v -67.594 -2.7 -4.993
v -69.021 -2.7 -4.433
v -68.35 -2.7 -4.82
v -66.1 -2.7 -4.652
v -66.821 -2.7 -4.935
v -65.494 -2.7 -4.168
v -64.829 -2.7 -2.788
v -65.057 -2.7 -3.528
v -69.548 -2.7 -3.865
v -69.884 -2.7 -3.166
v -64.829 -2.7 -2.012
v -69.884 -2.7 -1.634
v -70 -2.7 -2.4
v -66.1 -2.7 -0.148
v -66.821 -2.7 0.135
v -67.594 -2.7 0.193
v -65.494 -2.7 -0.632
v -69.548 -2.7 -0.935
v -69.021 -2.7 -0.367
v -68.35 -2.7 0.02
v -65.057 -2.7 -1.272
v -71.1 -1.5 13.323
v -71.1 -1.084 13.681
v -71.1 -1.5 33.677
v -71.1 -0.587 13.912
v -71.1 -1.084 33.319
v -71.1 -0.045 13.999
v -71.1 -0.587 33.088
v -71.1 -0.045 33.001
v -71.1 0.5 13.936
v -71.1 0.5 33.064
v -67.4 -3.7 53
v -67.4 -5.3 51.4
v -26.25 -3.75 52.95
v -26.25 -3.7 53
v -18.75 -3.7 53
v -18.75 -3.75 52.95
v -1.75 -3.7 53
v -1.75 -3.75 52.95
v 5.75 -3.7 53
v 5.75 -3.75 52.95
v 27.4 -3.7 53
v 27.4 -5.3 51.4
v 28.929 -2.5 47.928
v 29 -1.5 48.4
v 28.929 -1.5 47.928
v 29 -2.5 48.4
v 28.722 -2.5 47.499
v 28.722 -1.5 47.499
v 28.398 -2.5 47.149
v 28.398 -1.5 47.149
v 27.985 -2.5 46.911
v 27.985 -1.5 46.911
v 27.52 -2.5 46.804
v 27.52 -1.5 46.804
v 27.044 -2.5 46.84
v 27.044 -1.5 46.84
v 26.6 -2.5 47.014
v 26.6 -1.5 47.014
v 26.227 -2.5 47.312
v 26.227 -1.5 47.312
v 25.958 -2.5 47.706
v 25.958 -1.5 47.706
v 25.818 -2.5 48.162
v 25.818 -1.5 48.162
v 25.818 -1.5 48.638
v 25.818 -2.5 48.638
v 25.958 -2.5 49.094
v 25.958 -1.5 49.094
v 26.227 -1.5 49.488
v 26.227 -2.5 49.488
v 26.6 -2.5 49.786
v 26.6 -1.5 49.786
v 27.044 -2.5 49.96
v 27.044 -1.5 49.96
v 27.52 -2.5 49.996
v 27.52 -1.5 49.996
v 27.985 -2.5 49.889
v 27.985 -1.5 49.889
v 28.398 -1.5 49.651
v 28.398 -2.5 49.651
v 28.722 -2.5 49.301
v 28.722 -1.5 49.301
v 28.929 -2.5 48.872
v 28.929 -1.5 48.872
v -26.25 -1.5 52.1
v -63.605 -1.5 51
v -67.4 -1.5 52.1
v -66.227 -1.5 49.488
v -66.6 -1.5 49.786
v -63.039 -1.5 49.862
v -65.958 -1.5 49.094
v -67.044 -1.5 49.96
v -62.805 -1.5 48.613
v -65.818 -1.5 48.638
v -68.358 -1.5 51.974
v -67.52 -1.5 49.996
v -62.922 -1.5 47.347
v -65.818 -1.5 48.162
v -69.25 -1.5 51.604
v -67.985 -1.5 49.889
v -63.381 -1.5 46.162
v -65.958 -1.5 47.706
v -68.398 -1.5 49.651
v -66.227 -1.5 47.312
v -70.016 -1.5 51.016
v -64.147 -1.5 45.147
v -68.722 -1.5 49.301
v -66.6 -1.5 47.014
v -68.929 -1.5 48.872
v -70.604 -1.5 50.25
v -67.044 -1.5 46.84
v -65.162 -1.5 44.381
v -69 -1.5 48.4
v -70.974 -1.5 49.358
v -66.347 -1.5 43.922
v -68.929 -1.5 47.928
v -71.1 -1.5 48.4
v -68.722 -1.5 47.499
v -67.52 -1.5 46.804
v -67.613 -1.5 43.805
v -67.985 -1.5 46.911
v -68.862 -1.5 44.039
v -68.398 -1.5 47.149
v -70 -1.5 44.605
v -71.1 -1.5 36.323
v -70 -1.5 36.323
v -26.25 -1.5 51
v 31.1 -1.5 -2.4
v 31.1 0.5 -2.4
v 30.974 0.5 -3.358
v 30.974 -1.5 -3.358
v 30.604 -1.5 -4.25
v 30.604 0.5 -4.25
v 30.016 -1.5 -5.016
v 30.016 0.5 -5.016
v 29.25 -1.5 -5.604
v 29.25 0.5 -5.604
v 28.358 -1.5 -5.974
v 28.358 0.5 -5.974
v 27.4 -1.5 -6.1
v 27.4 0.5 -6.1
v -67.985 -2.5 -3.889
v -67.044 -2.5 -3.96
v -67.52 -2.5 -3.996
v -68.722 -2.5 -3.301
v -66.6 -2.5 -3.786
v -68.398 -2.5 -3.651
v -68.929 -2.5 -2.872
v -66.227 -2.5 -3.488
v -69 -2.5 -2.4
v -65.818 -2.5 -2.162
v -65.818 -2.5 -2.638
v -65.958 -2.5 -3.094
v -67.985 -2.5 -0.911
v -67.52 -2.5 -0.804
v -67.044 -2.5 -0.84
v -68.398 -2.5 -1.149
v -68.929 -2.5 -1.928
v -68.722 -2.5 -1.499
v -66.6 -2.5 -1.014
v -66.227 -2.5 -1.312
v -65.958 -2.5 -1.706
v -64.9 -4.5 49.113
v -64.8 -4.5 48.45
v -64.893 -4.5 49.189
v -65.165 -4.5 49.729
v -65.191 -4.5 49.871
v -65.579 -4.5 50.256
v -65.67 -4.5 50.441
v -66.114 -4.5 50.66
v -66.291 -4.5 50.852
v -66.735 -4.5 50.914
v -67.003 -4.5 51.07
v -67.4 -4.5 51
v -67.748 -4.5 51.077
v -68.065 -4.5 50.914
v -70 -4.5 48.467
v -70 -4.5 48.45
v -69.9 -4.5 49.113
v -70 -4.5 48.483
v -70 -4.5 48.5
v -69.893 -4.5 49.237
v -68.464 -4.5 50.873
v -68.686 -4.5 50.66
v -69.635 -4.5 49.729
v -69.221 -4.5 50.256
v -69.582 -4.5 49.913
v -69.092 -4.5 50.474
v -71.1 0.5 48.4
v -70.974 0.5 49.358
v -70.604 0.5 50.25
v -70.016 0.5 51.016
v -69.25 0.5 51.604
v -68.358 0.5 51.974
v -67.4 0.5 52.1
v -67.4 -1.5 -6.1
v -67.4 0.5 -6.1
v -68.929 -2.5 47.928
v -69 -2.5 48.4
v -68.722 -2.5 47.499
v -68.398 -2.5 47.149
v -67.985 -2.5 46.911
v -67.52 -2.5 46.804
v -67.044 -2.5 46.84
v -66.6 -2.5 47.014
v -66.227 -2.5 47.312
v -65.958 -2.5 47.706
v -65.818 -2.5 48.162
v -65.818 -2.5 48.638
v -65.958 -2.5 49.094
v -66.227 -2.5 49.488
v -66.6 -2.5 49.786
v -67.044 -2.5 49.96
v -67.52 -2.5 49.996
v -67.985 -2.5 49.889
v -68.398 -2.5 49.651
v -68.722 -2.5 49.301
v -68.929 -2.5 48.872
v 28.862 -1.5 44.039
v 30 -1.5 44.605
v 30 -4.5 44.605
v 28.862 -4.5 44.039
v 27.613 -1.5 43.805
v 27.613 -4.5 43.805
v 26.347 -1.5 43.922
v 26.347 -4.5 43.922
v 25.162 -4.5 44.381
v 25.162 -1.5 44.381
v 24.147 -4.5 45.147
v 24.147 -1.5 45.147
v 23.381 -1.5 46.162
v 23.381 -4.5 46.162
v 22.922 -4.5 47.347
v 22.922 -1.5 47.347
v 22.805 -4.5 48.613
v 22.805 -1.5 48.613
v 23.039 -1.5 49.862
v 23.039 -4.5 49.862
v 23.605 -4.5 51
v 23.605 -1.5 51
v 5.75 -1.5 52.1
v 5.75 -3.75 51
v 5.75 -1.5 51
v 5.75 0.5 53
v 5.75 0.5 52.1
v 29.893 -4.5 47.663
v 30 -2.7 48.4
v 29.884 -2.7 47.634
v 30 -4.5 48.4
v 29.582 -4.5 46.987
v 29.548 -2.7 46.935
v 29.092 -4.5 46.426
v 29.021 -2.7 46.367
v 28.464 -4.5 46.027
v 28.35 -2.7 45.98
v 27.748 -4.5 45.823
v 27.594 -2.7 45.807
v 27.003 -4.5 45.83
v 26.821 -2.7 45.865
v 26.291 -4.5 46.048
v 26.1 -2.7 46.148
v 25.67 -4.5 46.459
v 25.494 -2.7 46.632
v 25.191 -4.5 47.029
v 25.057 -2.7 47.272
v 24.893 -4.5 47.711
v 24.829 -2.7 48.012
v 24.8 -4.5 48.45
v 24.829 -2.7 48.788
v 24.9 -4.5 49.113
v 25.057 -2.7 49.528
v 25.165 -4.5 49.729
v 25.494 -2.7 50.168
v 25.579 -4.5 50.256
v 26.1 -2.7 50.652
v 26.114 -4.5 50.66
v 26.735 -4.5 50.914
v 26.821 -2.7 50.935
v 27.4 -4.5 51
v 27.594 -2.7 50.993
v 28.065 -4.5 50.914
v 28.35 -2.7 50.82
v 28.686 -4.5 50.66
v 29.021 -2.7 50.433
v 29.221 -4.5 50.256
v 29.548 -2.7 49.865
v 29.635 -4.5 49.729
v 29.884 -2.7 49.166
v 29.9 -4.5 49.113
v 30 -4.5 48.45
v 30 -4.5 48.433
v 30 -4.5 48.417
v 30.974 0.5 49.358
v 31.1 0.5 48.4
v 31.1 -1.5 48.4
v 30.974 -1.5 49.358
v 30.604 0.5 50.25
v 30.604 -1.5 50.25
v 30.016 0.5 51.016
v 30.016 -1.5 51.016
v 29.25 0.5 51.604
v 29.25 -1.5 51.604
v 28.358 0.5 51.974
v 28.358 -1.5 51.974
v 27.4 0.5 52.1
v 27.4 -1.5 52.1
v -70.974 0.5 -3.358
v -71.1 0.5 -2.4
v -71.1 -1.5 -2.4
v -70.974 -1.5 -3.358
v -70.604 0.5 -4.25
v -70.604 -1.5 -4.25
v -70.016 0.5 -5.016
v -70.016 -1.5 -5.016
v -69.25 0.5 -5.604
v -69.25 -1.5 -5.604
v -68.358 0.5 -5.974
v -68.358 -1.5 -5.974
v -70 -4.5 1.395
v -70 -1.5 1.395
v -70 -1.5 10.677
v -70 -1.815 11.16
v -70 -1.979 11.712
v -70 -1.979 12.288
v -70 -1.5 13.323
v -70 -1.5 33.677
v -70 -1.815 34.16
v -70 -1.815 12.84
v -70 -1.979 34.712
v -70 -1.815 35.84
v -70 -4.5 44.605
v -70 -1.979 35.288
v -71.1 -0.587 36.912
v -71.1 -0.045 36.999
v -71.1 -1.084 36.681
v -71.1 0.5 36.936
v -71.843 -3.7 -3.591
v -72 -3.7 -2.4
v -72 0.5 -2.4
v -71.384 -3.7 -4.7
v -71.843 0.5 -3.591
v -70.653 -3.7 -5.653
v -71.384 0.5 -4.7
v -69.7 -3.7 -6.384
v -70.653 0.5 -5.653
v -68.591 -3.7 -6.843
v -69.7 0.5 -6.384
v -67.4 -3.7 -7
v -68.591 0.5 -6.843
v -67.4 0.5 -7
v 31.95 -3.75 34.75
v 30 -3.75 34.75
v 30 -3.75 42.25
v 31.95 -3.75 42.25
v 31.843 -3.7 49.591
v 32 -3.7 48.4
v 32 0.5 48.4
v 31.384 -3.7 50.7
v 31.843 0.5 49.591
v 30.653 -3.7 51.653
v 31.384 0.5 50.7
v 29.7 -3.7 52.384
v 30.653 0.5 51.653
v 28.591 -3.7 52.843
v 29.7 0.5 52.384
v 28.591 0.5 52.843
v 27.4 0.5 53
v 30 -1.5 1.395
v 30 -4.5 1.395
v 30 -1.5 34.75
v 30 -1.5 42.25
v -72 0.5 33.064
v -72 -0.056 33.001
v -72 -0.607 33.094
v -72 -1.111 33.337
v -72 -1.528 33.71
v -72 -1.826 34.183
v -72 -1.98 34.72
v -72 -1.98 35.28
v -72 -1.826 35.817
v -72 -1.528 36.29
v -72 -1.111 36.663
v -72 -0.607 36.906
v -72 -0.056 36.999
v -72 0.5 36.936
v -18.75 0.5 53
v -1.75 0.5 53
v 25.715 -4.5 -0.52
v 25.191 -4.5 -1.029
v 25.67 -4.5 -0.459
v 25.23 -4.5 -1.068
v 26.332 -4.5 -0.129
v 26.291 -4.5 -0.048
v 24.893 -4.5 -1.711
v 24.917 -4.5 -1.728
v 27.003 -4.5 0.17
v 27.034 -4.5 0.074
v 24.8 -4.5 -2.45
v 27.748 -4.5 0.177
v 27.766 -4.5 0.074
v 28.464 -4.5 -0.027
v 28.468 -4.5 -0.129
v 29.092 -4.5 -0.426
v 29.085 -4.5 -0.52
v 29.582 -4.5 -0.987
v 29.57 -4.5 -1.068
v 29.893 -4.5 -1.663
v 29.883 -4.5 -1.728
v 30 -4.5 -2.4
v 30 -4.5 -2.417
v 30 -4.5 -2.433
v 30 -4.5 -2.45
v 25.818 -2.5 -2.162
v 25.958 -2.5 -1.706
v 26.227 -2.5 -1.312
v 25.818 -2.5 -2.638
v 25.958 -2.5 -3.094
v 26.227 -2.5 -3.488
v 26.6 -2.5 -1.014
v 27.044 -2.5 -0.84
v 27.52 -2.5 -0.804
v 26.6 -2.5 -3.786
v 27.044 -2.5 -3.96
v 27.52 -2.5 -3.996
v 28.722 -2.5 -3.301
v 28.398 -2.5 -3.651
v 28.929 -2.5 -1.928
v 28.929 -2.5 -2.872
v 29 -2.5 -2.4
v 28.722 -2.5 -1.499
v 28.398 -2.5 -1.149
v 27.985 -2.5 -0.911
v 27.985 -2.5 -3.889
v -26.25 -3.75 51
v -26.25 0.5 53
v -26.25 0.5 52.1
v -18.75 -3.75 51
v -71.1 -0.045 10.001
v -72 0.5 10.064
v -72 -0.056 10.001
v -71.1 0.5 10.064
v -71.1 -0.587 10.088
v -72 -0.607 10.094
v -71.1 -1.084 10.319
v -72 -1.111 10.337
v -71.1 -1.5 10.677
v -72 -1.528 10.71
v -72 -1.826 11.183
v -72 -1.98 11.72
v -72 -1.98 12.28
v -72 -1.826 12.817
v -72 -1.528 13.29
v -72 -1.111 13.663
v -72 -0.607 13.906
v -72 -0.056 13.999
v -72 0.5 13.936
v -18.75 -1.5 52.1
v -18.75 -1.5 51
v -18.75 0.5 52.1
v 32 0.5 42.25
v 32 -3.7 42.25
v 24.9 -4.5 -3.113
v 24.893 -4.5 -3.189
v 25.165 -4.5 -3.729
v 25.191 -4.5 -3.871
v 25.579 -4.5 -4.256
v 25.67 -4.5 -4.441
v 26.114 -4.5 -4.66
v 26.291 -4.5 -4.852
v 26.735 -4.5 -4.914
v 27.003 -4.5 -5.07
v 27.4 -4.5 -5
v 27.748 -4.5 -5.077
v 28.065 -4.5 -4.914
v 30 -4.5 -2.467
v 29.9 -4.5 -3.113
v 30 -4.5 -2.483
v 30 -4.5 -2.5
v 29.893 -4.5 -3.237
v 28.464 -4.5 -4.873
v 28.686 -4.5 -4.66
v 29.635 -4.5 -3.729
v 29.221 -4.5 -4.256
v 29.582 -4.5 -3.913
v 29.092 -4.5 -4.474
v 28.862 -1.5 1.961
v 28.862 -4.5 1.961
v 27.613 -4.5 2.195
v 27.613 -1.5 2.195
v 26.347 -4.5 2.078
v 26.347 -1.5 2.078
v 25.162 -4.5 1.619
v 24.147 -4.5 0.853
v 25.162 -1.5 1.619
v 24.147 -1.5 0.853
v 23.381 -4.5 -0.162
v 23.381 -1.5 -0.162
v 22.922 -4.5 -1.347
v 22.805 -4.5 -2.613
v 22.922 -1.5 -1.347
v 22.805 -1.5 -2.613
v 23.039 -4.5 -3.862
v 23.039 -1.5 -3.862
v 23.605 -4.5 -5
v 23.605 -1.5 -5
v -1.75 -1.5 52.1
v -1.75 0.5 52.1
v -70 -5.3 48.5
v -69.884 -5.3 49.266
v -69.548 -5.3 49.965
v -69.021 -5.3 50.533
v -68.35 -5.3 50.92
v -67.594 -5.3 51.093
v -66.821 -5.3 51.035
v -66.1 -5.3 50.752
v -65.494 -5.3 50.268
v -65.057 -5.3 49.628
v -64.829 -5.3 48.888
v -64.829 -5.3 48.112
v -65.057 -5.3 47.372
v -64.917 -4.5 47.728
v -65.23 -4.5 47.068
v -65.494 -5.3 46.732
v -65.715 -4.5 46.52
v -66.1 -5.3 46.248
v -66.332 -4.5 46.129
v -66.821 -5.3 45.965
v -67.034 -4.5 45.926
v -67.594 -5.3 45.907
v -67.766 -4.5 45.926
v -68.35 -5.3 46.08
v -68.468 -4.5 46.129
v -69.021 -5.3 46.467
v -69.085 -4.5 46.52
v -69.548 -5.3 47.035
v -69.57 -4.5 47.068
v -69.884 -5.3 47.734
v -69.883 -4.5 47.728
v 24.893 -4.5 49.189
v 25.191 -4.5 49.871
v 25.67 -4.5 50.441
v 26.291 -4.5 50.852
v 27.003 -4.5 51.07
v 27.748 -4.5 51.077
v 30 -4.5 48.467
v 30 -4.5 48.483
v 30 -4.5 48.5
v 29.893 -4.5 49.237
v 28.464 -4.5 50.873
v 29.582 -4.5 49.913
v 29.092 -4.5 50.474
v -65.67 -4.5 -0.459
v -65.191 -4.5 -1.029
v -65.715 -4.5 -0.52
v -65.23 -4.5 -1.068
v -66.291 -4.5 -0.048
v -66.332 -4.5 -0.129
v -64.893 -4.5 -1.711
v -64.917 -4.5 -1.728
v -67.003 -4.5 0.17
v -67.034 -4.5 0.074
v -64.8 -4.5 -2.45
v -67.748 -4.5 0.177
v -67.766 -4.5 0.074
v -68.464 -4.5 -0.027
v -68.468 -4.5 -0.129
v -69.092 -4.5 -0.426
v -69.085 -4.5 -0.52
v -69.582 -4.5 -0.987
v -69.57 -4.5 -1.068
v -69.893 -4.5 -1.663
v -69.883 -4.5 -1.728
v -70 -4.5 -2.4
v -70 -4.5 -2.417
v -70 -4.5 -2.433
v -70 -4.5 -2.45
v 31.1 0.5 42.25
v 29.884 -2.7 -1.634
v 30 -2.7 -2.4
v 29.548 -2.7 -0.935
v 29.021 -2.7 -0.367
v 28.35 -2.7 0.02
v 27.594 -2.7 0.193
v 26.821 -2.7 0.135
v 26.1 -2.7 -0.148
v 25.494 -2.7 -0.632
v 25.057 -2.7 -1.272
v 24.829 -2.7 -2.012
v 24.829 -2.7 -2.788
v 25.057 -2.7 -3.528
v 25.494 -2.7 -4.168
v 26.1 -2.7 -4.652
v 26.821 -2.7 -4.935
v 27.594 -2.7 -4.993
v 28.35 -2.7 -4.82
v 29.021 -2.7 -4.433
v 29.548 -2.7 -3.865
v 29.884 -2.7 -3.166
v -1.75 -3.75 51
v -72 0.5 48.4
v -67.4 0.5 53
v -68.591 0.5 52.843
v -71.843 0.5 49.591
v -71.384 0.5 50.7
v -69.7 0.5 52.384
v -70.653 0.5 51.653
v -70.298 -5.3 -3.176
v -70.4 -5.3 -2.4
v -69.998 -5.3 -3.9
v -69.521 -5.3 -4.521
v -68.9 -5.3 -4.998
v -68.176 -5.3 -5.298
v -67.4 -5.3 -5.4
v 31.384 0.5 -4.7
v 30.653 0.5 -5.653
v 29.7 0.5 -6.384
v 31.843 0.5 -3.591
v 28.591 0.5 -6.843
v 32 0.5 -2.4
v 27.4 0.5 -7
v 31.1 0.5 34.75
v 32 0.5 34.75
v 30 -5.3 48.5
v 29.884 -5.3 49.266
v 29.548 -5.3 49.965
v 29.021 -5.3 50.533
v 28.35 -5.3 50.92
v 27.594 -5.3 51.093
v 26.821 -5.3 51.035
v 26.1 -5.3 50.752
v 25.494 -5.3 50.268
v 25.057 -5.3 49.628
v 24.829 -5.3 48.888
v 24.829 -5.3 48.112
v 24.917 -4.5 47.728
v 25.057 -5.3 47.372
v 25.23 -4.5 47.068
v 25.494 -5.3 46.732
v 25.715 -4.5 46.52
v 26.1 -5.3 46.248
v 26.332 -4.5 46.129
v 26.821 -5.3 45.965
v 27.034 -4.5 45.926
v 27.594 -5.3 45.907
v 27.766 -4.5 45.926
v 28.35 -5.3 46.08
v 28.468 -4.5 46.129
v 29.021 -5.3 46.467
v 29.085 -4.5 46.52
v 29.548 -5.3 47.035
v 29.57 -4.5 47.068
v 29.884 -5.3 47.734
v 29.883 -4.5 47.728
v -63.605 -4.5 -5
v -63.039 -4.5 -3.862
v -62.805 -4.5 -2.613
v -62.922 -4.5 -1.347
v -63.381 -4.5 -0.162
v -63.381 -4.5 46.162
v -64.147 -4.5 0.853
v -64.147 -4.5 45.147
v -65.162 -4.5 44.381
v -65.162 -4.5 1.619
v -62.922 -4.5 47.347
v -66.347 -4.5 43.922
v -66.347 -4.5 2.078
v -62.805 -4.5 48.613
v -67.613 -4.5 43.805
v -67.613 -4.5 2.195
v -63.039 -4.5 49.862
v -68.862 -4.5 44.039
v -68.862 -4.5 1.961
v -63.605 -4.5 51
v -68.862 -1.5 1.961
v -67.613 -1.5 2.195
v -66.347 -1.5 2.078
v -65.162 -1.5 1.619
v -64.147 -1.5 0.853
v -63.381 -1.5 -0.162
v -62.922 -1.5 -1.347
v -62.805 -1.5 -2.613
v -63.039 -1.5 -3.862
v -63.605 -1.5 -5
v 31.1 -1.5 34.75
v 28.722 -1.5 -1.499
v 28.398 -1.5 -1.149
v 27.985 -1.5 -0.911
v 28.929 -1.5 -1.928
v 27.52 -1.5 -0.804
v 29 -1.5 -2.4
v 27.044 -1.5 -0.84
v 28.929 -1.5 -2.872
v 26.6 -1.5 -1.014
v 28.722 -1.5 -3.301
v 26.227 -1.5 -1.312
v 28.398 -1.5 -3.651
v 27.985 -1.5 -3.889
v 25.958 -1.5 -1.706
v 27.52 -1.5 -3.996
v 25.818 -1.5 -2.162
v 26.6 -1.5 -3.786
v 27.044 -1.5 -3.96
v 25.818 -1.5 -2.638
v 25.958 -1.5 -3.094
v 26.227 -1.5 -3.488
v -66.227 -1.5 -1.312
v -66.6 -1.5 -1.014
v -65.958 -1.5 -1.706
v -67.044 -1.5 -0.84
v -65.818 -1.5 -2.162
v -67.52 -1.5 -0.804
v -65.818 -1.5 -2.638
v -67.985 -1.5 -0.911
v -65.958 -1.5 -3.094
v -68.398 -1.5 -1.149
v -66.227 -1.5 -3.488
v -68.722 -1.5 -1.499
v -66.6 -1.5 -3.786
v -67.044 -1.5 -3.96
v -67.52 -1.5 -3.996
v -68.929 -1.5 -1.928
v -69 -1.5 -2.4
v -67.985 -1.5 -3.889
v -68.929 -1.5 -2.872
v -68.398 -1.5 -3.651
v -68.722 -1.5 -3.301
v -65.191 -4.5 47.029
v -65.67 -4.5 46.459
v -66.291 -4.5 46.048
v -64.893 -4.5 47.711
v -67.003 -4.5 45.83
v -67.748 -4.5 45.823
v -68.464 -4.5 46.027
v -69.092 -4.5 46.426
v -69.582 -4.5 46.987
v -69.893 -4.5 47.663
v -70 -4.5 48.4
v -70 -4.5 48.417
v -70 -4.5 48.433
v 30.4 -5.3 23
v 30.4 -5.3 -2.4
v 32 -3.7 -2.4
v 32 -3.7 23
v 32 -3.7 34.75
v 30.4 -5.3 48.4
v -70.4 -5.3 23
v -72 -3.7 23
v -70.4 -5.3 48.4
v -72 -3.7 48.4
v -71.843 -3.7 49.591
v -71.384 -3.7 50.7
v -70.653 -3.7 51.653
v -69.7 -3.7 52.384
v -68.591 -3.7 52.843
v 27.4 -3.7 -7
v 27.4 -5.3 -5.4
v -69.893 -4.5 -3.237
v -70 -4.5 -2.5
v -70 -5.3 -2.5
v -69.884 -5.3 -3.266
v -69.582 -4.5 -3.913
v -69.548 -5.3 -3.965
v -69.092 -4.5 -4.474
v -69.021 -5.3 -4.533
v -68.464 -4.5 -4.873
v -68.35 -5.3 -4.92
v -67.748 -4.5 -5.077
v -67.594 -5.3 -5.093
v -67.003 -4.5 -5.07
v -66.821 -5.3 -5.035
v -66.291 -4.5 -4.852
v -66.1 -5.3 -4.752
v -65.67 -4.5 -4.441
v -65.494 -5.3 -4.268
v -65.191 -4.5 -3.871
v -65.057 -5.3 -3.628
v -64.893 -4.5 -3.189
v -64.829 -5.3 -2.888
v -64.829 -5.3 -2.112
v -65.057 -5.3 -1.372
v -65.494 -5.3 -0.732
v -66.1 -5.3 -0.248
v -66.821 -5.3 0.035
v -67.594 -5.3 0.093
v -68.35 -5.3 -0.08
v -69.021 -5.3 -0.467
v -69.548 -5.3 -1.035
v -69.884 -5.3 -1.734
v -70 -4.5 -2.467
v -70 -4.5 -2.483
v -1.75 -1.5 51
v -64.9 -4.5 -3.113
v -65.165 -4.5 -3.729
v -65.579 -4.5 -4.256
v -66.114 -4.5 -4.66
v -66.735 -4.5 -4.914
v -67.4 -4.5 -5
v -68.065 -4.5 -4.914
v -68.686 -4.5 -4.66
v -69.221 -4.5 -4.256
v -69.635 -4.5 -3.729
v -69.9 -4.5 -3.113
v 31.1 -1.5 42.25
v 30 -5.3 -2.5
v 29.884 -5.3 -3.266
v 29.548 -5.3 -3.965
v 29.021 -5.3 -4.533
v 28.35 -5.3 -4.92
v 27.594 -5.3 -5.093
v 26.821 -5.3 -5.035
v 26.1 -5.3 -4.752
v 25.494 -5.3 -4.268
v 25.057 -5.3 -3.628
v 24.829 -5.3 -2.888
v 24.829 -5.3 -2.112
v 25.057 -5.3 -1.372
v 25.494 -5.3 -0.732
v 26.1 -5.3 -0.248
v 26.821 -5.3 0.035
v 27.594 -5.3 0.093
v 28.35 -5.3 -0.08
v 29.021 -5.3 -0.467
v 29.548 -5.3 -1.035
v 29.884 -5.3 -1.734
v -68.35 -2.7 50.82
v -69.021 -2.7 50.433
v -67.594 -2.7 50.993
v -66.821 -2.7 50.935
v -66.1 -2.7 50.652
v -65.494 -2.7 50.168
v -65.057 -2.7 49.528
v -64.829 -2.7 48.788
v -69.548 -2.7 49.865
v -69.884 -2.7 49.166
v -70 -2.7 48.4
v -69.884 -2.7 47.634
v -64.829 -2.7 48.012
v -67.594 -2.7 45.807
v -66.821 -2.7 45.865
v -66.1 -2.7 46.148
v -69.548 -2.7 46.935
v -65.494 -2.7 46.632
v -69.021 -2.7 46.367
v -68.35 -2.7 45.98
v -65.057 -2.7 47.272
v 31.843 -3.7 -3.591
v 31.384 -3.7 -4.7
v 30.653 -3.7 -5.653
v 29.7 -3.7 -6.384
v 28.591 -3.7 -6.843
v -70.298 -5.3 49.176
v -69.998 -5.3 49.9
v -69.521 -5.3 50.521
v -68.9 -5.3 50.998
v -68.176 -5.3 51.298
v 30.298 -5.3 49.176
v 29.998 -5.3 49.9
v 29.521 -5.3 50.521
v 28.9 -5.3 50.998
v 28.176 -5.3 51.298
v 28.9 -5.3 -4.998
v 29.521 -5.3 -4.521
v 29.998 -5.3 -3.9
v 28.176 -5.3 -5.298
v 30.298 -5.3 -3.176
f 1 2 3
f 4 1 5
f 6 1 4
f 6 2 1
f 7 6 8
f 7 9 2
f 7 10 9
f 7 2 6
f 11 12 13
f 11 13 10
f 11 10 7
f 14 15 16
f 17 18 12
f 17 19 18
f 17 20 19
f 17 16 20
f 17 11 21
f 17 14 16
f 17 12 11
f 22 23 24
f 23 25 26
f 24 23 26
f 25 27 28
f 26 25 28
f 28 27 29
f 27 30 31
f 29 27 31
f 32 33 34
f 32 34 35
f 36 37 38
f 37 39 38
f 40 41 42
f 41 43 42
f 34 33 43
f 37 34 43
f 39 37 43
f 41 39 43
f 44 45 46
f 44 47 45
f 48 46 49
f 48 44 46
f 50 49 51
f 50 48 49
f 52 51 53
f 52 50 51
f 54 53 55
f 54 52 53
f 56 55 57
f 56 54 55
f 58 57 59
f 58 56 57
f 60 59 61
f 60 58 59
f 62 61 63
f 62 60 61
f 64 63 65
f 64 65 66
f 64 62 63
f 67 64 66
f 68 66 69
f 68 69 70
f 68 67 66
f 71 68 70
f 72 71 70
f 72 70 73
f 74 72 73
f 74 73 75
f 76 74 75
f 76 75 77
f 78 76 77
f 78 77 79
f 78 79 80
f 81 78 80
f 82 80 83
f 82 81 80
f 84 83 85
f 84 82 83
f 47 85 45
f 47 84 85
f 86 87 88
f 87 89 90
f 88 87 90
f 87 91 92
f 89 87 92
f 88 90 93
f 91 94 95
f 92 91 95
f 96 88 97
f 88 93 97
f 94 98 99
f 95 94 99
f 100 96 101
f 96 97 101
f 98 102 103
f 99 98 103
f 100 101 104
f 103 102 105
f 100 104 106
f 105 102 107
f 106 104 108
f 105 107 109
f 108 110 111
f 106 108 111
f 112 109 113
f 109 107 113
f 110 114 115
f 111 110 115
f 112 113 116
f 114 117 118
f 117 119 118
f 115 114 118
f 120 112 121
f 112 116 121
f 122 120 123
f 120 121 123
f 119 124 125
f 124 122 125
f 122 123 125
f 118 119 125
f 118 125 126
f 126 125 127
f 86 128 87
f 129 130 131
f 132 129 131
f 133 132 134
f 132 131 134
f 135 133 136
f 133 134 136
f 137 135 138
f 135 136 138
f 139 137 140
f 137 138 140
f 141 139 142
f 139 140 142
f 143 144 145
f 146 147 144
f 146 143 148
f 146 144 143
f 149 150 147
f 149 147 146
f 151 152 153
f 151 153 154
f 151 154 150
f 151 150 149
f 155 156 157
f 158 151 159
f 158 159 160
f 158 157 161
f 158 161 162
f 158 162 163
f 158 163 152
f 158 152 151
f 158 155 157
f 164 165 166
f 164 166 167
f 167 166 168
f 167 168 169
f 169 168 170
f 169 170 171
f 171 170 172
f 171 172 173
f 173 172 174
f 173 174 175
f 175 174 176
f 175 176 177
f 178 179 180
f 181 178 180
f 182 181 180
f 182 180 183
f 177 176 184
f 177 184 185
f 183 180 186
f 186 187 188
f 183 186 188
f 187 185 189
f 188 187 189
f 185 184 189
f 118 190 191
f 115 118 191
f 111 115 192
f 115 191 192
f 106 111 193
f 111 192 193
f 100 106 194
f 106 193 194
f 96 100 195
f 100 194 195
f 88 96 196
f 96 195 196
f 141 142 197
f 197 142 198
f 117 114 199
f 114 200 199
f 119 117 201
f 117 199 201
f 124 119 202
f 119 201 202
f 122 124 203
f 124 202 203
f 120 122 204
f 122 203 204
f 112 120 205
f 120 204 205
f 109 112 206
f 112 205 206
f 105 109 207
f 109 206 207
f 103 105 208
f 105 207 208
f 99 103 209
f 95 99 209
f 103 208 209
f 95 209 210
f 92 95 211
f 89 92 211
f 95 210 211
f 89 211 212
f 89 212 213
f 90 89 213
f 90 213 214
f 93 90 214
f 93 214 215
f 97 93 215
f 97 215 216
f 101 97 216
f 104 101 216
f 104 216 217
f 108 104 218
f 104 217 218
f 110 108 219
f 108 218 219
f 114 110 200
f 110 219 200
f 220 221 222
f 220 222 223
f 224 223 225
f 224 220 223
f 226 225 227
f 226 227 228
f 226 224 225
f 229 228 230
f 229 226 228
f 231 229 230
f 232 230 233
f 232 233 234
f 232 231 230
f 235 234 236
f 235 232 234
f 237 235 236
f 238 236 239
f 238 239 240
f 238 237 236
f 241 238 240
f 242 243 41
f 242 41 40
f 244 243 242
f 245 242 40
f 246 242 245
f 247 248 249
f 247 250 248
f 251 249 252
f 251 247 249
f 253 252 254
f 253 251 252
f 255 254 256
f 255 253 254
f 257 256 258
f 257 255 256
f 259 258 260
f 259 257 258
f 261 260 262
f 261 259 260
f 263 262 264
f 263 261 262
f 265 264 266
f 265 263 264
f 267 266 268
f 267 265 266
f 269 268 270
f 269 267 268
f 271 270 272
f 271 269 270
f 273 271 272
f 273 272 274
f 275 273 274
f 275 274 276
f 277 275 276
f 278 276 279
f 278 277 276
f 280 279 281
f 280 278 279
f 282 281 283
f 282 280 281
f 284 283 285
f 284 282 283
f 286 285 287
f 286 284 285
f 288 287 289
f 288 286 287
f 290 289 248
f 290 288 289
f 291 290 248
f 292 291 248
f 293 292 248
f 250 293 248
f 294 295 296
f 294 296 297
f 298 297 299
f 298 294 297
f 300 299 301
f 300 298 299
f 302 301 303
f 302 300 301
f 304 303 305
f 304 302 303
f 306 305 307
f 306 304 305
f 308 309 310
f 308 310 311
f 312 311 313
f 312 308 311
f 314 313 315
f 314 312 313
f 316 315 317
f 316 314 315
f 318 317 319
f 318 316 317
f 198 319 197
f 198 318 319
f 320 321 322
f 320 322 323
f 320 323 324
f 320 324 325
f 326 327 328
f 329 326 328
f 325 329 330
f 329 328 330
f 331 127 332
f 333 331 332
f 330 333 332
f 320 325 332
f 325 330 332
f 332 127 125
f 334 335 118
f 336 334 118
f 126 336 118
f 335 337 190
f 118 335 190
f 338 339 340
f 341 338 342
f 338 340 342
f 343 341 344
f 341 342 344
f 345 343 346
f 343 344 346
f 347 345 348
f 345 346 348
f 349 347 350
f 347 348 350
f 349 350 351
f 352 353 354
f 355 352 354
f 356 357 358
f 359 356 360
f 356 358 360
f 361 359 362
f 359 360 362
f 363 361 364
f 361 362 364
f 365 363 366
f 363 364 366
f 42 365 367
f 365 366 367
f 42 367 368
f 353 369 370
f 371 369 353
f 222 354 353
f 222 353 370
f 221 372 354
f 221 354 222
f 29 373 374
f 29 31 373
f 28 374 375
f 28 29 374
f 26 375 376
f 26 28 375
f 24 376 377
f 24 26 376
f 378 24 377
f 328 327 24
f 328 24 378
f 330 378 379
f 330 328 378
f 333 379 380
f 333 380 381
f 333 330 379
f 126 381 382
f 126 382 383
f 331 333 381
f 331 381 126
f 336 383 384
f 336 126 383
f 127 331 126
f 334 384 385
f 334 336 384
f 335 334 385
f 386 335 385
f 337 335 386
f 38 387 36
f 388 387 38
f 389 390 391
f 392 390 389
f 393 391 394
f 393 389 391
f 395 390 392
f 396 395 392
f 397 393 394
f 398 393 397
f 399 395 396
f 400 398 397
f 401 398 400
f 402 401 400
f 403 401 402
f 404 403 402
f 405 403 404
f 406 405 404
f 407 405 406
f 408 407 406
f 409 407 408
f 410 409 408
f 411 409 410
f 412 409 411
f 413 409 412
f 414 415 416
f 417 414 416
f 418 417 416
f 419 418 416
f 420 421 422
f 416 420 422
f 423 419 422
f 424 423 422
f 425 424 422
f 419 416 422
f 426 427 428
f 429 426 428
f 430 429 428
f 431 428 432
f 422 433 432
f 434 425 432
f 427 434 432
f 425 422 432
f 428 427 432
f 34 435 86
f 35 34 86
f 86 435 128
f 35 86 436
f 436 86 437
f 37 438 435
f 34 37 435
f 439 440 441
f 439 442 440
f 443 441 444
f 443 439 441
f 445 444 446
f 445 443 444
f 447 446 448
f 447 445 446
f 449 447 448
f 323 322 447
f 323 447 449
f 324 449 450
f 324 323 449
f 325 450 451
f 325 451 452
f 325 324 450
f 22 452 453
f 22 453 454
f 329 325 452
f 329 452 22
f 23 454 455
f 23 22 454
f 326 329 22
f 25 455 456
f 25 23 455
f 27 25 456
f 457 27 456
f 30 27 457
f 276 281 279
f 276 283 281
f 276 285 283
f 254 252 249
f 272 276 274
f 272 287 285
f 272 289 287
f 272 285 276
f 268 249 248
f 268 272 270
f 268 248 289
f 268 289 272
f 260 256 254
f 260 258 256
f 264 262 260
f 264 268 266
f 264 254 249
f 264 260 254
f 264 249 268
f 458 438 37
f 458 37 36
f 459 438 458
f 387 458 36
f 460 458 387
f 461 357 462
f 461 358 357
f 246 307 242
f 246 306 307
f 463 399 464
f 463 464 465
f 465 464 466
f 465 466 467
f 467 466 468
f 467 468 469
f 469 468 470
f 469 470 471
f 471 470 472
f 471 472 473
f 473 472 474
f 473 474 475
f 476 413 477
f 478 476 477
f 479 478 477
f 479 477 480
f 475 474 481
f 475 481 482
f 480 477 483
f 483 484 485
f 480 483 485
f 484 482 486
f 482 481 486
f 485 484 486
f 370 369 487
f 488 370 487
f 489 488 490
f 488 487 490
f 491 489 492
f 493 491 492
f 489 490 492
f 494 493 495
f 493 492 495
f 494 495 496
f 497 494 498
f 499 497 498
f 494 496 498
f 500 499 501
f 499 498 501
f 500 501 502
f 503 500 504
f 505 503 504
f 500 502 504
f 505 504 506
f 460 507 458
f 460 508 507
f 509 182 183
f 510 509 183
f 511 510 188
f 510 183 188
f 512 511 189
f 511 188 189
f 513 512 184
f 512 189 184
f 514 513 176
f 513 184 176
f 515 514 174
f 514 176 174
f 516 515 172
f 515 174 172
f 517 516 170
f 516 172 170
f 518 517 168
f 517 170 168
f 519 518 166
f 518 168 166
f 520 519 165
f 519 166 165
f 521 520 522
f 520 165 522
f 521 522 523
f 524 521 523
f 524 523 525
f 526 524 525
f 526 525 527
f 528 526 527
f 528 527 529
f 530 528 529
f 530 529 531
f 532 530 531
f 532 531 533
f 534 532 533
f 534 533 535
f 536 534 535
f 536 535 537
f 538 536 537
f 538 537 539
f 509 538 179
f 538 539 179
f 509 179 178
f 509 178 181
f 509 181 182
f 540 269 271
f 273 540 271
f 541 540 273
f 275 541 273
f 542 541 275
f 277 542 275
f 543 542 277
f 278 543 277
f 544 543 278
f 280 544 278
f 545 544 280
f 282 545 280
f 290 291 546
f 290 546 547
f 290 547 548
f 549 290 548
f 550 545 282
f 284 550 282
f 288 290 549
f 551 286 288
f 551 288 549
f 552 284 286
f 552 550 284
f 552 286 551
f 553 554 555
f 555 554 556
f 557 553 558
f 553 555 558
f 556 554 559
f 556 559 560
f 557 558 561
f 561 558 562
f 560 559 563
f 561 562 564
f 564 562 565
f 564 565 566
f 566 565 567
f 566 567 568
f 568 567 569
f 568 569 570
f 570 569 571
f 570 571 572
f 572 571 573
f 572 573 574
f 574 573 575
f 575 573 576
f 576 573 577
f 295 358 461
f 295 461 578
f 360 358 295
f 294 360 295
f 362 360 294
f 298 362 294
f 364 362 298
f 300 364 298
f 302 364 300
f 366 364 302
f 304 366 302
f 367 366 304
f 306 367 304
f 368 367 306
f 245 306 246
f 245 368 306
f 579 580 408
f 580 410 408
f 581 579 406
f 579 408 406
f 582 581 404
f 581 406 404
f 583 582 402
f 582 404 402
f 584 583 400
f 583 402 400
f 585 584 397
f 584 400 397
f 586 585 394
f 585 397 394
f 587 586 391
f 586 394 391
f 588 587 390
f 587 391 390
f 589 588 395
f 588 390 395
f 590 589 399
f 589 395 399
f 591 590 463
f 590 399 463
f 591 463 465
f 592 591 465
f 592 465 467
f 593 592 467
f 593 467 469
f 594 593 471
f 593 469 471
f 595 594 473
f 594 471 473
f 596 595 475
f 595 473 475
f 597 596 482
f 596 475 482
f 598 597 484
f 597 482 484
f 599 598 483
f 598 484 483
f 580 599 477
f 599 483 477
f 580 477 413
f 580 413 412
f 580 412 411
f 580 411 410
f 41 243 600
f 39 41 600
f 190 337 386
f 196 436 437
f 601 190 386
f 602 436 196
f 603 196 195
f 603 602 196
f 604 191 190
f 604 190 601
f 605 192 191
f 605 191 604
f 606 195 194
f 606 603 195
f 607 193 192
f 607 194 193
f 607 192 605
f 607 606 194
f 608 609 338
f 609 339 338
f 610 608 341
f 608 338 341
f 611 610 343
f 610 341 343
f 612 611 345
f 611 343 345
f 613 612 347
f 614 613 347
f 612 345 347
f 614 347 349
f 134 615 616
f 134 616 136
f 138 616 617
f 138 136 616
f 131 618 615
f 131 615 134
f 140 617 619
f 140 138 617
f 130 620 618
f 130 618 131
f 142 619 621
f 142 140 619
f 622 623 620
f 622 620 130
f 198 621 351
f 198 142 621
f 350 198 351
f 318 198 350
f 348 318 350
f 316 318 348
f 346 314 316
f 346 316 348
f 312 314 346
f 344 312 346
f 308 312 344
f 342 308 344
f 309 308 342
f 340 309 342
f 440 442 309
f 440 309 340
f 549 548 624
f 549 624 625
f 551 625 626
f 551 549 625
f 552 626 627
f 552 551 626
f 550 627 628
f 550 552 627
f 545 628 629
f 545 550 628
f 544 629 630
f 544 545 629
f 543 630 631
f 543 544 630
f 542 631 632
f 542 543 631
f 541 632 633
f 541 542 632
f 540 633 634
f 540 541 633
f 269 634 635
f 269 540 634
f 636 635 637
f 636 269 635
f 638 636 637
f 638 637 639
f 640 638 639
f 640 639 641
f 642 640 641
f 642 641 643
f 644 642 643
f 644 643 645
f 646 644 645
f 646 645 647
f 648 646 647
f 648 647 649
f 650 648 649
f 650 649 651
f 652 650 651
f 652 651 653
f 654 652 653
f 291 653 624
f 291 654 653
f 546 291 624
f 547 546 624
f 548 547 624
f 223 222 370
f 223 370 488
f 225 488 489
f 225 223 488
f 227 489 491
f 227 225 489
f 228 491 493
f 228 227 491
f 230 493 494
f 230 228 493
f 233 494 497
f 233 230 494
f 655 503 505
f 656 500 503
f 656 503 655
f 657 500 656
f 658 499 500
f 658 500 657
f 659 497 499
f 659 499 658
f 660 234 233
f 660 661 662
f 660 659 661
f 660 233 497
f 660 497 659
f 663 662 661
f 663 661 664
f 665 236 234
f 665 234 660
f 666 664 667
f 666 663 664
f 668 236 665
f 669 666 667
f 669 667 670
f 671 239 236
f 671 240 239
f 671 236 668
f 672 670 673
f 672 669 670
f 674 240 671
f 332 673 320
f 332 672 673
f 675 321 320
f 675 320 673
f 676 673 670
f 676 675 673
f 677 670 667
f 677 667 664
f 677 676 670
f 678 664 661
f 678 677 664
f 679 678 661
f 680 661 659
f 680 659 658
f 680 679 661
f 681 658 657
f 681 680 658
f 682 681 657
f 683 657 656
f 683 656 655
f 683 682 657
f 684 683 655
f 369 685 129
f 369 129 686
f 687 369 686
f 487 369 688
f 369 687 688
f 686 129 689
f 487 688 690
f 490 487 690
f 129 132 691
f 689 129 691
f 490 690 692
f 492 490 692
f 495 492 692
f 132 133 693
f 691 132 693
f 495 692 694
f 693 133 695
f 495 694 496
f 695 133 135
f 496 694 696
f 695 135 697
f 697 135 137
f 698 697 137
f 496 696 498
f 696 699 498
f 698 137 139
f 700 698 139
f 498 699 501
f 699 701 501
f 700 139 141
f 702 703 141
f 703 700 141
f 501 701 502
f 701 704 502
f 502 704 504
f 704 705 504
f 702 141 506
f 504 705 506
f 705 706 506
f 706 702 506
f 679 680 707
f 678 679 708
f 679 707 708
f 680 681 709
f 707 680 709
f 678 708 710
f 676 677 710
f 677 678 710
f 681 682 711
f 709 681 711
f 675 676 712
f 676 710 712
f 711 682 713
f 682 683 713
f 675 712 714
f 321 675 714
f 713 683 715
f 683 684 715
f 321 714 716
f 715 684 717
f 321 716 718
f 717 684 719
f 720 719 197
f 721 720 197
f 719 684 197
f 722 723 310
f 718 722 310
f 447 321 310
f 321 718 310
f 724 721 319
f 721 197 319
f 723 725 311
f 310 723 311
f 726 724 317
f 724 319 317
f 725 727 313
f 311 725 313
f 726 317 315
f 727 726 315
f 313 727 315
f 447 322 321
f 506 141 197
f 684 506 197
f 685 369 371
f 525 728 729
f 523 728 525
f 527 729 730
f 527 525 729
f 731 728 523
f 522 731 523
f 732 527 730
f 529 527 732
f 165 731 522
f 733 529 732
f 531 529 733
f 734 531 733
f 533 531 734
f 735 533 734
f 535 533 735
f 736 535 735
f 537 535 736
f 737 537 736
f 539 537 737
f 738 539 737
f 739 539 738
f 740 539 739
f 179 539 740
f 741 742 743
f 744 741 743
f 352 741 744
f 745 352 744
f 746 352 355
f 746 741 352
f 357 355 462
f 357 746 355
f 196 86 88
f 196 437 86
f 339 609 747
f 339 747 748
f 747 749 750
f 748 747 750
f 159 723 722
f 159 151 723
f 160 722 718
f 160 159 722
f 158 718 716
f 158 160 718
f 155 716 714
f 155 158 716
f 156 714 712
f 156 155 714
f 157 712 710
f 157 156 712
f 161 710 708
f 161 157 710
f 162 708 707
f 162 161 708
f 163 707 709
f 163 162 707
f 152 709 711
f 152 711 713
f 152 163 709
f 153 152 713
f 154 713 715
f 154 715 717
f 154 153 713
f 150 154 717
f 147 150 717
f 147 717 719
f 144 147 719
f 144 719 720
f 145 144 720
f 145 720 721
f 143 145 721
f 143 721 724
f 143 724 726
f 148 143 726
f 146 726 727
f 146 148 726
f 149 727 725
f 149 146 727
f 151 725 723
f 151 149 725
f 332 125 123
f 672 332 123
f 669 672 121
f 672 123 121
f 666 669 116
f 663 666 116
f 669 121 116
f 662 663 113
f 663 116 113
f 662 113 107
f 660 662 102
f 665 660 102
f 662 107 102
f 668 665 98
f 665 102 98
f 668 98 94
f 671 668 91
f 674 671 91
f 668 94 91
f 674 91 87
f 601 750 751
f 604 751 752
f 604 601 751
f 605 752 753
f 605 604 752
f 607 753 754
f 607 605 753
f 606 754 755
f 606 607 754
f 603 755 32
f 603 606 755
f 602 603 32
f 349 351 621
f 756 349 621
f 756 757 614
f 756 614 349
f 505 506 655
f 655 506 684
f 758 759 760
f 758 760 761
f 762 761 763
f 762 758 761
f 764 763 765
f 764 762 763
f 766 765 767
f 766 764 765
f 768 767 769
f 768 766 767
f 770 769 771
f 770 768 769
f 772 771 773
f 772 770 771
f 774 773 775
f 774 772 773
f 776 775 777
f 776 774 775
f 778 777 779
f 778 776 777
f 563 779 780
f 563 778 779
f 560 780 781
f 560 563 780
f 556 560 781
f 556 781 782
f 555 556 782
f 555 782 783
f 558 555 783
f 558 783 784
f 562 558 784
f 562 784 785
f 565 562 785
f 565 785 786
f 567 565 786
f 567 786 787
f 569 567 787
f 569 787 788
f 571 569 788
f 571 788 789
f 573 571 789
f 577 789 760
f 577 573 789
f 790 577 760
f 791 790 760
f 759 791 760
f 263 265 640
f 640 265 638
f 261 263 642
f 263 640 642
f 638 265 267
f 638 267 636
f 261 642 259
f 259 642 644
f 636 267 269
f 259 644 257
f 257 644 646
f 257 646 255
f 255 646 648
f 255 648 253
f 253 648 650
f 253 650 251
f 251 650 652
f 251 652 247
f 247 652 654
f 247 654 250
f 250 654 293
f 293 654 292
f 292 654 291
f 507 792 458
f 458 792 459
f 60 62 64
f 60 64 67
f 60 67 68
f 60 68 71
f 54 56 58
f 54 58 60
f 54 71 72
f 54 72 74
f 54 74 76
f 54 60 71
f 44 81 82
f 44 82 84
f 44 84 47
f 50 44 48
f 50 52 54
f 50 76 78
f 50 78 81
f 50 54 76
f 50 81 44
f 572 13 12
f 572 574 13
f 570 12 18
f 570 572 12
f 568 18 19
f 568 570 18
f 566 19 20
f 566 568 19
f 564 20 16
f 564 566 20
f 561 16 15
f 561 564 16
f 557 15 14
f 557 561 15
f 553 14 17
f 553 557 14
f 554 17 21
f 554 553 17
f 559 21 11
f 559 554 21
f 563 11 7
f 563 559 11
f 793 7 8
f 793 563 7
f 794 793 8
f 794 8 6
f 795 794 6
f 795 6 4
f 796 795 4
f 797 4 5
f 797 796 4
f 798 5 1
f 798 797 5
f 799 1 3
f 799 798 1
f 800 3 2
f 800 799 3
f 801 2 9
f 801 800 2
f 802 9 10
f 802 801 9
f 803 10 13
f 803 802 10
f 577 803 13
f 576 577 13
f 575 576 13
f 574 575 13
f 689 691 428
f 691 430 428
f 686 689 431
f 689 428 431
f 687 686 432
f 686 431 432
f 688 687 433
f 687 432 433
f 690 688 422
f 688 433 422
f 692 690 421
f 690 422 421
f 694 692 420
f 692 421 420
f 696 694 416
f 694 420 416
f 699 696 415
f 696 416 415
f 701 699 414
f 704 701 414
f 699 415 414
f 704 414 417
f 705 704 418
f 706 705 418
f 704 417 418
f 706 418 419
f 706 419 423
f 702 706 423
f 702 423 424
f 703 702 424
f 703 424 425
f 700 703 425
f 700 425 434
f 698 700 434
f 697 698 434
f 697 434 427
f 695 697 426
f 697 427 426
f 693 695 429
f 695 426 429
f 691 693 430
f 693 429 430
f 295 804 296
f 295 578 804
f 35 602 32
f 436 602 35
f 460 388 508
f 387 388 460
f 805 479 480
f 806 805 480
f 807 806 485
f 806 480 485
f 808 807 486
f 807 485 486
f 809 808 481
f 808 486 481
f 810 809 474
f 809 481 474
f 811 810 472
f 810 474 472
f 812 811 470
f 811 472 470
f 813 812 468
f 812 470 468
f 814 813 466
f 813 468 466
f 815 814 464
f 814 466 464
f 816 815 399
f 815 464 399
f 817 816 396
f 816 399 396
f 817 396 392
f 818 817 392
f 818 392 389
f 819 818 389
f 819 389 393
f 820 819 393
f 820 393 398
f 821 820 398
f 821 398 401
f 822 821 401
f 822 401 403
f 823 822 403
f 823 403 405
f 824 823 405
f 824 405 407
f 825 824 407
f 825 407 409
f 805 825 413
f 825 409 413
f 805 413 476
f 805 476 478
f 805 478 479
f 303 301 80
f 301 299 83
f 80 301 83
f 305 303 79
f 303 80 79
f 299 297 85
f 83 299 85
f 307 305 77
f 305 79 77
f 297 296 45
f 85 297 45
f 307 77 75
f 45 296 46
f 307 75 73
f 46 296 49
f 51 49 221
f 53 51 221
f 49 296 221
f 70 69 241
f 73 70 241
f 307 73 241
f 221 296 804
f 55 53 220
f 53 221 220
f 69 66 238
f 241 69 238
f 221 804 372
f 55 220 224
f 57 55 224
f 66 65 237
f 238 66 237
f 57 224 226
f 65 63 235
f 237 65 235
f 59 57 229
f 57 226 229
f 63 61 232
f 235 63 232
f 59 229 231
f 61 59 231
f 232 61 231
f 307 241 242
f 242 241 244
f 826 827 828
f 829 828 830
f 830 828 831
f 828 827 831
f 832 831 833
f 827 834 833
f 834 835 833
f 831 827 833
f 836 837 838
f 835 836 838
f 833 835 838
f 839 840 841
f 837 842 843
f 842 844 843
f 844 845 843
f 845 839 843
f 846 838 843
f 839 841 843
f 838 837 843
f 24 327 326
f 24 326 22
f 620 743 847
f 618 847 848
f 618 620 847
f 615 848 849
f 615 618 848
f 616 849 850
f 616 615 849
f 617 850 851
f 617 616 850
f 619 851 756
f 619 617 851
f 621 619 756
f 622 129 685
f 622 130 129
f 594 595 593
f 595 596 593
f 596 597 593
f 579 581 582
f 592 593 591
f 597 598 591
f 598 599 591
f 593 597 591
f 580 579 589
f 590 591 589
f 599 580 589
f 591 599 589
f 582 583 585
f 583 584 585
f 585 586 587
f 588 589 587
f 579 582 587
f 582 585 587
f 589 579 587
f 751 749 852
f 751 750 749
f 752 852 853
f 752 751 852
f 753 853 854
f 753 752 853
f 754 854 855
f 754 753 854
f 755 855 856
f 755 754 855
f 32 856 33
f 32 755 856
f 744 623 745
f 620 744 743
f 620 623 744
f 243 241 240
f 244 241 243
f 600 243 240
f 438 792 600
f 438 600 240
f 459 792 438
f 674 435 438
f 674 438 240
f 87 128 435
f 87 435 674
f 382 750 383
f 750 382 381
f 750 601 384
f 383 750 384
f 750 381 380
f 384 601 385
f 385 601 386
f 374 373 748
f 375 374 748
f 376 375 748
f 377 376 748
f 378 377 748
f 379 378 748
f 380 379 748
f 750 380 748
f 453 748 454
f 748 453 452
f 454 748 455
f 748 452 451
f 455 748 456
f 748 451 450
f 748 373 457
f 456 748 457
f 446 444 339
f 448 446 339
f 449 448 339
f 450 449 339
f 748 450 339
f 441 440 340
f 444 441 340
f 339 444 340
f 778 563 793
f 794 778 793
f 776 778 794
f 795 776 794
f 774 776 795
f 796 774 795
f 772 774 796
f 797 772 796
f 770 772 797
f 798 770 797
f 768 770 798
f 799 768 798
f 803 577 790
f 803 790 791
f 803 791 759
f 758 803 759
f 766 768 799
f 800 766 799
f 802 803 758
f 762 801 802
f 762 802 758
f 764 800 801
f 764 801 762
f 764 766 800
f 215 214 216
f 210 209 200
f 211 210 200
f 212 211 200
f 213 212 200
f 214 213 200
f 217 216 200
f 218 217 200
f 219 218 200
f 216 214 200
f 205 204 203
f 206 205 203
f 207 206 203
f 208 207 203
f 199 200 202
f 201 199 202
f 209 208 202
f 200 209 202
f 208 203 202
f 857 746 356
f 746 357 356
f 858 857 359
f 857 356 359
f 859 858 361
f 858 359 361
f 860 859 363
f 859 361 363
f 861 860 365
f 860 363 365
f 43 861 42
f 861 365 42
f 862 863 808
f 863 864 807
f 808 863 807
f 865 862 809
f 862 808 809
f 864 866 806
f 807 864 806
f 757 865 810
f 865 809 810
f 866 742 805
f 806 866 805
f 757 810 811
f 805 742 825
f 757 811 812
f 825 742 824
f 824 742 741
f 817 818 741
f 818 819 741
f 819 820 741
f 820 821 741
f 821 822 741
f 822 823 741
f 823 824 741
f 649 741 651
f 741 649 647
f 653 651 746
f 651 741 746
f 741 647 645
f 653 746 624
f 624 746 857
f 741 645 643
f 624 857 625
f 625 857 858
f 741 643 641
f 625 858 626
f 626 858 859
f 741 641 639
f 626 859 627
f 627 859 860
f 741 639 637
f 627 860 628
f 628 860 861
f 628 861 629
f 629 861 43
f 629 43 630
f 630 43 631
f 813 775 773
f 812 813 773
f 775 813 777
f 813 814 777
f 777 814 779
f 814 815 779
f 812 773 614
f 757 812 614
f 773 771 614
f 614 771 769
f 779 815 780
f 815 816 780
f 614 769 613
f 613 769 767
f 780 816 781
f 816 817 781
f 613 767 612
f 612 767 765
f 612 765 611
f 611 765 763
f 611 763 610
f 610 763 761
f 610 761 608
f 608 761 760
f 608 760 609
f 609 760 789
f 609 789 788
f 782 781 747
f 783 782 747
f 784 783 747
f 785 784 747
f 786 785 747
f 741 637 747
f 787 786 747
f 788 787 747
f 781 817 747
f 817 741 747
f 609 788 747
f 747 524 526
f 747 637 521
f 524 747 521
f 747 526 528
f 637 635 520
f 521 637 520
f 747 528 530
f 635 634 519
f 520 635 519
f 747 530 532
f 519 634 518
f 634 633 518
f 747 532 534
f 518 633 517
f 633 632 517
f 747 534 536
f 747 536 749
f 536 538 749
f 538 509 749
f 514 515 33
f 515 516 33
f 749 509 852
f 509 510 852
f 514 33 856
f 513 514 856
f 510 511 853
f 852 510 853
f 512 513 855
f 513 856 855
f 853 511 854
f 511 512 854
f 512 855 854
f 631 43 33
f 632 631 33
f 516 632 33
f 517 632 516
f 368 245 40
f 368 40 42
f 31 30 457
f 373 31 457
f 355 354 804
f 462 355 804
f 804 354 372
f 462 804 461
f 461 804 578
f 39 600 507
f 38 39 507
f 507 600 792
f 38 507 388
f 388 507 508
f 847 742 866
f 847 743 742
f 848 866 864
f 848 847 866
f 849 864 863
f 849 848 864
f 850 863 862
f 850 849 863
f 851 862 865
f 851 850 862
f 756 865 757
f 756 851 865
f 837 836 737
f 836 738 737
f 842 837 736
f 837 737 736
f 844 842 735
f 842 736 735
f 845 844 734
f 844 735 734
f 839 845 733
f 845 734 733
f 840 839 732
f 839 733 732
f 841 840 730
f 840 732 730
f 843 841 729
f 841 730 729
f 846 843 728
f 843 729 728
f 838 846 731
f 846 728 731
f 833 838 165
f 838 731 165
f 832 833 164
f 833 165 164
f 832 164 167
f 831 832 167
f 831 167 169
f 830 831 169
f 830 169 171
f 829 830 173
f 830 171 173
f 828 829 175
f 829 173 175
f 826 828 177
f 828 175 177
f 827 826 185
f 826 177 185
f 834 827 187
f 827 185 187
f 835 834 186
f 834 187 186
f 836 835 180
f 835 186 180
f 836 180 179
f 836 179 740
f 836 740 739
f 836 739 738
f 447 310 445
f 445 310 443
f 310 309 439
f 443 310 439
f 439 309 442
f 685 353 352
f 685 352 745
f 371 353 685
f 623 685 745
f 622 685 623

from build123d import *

# Parameters (mm, degrees)
CYLINDER001_R           = 2
CYLINDER001_DEPTH       = 10
SKETCH037_W             = 7.5
SKETCH037_H             = 7.5
EXTRUDE045_DEPTH        = 10
BOX089_W                = 11
BOX089_H                = 10
BOX089_DEPTH            = 35
BODY005_PLACEMENT_ANGLE = 90
BODY006_PLACEMENT_ANGLE = 90
CYLINDER003_R           = 2
CYLINDER003_DEPTH       = 10
CYLINDER002_R           = 1.7
CYLINDER002_DEPTH       = 10
SKETCH032_R             = 2.6
EXTRUDE043_DEPTH        = 0.8
EXTRUDE040_DEPTH        = 3
EXTRUDE038_DEPTH        = 2
EXTRUDE041_DEPTH        = 0.8


with BuildPart() as battery_cable:
    # Cylinder001 → Cylinder001 (new body)
    with BuildSketch(Plane(origin=(-66.5, 0, 35), x_dir=(0, 0, 1), z_dir=(-1, 0, 0))):
        Circle(CYLINDER001_R)
    extrude(amount=CYLINDER001_DEPTH)


with BuildPart() as switch_hole002:
    # Sketch037 → Extrude045 (new body)
    with BuildSketch(Plane.YZ.offset(35)):
        with Locations((0, 38.5)):
            Rectangle(SKETCH037_W, SKETCH037_H)
    extrude(amount=EXTRUDE045_DEPTH)


with BuildPart() as switch_hole002_1:
    # Extrude045 placement: moved
    add(switch_hole002.part.moved(Location((-9.5, 0, 0))))


with BuildPart() as dips001:
    # Box089 → Box089 (new body)
    with BuildSketch(Plane(origin=(-15, 0.5, 13.5), x_dir=(0, 0, -1), z_dir=(1, 0, 0))):
        with Locations((5.5, 5)):
            Rectangle(BOX089_W, BOX089_H)
    extrude(amount=BOX089_DEPTH)


with BuildPart() as switch_hole001:
    # Body005 base: copy of switch hole002
    add(switch_hole002_1.part)


with BuildPart() as switch_hole001_1:
    # Body005 placement: moved
    add(switch_hole001.part.moved(Location((40.5, 0, 22))).rotate(Axis((40.5, 0, 22), (0, -1, 0)), BODY005_PLACEMENT_ANGLE))


with BuildPart() as switch_hole:
    # Body006 base: copy of switch hole002
    add(switch_hole002_1.part)


with BuildPart() as switch_hole_1:
    # Body006 placement: moved
    add(switch_hole.part.moved(Location((16, 0, 22))).rotate(Axis((16, 0, 22), (0, -1, 0)), BODY006_PLACEMENT_ANGLE))


with BuildPart() as cable:
    # Cylinder003 → Cylinder003 (new body)
    with BuildSketch(Plane(origin=(-65.5, 0, 12), x_dir=(0, -1, 0), z_dir=(-1, 0, 0))):
        Circle(CYLINDER003_R)
    extrude(amount=CYLINDER003_DEPTH)


with BuildPart() as common_sub:
    # Cylinder002 → Cylinder002 (new body)
    with BuildSketch(Plane(origin=(25, -1.5, 28), x_dir=(1, 0, 0), z_dir=(0, 1, 0))):
        Circle(CYLINDER002_R)
    extrude(amount=CYLINDER002_DEPTH)

    # Fusion033: union battery cable, switch hole002, dips001, switch hole001, switch hole, cable
    add(battery_cable.part)
    add(switch_hole002_1.part)
    add(dips001.part)
    add(switch_hole001_1.part)
    add(switch_hole_1.part)
    add(cable.part)


with BuildPart() as sweep_body:
    # Sweep: sweep along a path in Sketch034
    with BuildLine(Plane.XZ.offset(10)) as sweep_path:
        Line((32, 12), (32, 48.4))
        ThreePointArc((32, 48.4), (30.652691, 51.652691), (27.4, 53))
        Line((27.4, 53), (-20, 53))
    # Sketch033 → Sweep (sweep)
    with BuildSketch(Plane.YZ):
        Polygon((-5.3, 51.4), (-3.7, 53), (-3.7, 54), (-6, 54), (-6, 51.4), align=None)
    sweep(path=sweep_path.line)


with BuildPart() as fusion:
    # Sketch032 → Extrude043 (new body)
    with BuildSketch(Plane.XZ.offset(10)):
        with Locations((27.4, 48.5)):
            Circle(SKETCH032_R)
    extrude(amount=EXTRUDE043_DEPTH)


with BuildPart() as fusion_1:
    # Extrude043 placement: moved
    add(fusion.part.moved(Location((0, 5.5, 0))))

    # Fusion: union Sweep body
    add(sweep_body.part)


with BuildPart() as bottom003:
    # Sketch028 → Extrude040 (new body)
    with BuildSketch(Plane.XZ.offset(10)):
        with BuildLine():
            ThreePointArc((32, 48.4), (30.652691, 51.652691), (27.4, 53))
            Line((27.4, 53), (-20, 53))
            Line((-20, 53), (-20, 51))
            Line((-20, 51), (27.4, 51))
            ThreePointArc((30, 48.4), (29.238478, 50.238478), (27.4, 51))
            Line((30, 23), (30, 48.4))
            Line((32, 23), (30, 23))
            Line((32, 48.4), (32, 23))
        make_face()
    extrude(amount=EXTRUDE040_DEPTH)


with BuildPart() as bottom003_1:
    # Extrude040 placement: moved
    add(bottom003.part.moved(Location((0, 8.5, 0))))


with BuildPart() as bottom004:
    # Sketch030 → Extrude038 (new body)
    with BuildSketch(Plane.XZ.offset(10)):
        with BuildLine():
            ThreePointArc((32, 48.4), (30.652691, 51.652691), (27.4, 53))
            Line((27.4, 53), (-20, 53))
            Line((-20, 53), (-20, 52.1))
            Line((-20, 52.1), (27.4, 52.1))
            ThreePointArc((31.1, 48.4), (30.016295, 51.016295), (27.4, 52.1))
            Line((31.1, 23), (31.1, 48.4))
            Line((32, 23), (31.1, 23))
            Line((32, 48.4), (32, 23))
        make_face()
    extrude(amount=EXTRUDE038_DEPTH)


with BuildPart() as bottom004_1:
    # Extrude038 placement: moved
    add(bottom004.part.moved(Location((0, 10.5, 0))))


with BuildPart() as screw_hole_bottom002:
    # Sketch003 → Revolve (revolve)
    with BuildSketch(Plane.XY):
        Polygon((1.6, 3), (1.6, 2), (0, 2), (0, 1.8), (2.6, 1.8), (2.6, 0), (4.6, 0), (4.6, 3), align=None)
    revolve(axis=Axis((0, 0, 0), (0, 1, 0)))


with BuildPart() as screw_hole_bottom002_1:
    # Body003 placement: moved
    add(screw_hole_bottom002.part.moved(Location((27.4, -4.5, 48.4))))


with BuildPart() as bottom:
    # Sketch031 → Extrude041 (new body)
    with BuildSketch(Plane.XZ.offset(10)):
        with BuildLine():
            ThreePointArc((32, 48.4), (30.652691, 51.652691), (27.4, 53))
            Line((27.4, 53), (-20, 53))
            Line((-20, 53), (-20, 23))
            Line((-20, 23), (32, 23))
            Line((32, 48.4), (32, 23))
        make_face()
    extrude(amount=EXTRUDE041_DEPTH)


with BuildPart() as bottom_1:
    # Extrude041 placement: moved
    add(bottom.part.moved(Location((0, 5.5, 0))))

    # Fusion029: union bottom003, bottom004, screw hole bottom002
    add(bottom003_1.part)
    add(bottom004_1.part)
    add(screw_hole_bottom002_1.part)

    # Cut: cut Fusion
    add(fusion_1.part, mode=Mode.SUBTRACT)


with BuildPart() as part_mirroring005:
    # Part__Mirroring005: instance of bottom
    add(bottom_1.part.mirror(Plane(origin=(-20, 0, 0), x_dir=(0, -1, 0), z_dir=(1, 0, 0))))


with BuildPart() as part_mirroring006:
    # Part__Mirroring006: instance of Part__Mirroring005
    add(part_mirroring005.part.mirror(Plane(origin=(0, 0, 23), x_dir=(0, 1, 0), z_dir=(0, 0, 1))))


with BuildPart() as bottom007:
    # Part__Mirroring004: instance of bottom
    add(bottom_1.part.mirror(Plane(origin=(0, 0, 23), x_dir=(0, 1, 0), z_dir=(0, 0, 1))))

    # Fusion031: union bottom, Part__Mirroring006, Part__Mirroring005
    add(bottom_1.part)
    add(part_mirroring006.part)
    add(part_mirroring005.part)

    # Cut026: cut common sub
    add(common_sub.part, mode=Mode.SUBTRACT)


solid = bottom007.part
